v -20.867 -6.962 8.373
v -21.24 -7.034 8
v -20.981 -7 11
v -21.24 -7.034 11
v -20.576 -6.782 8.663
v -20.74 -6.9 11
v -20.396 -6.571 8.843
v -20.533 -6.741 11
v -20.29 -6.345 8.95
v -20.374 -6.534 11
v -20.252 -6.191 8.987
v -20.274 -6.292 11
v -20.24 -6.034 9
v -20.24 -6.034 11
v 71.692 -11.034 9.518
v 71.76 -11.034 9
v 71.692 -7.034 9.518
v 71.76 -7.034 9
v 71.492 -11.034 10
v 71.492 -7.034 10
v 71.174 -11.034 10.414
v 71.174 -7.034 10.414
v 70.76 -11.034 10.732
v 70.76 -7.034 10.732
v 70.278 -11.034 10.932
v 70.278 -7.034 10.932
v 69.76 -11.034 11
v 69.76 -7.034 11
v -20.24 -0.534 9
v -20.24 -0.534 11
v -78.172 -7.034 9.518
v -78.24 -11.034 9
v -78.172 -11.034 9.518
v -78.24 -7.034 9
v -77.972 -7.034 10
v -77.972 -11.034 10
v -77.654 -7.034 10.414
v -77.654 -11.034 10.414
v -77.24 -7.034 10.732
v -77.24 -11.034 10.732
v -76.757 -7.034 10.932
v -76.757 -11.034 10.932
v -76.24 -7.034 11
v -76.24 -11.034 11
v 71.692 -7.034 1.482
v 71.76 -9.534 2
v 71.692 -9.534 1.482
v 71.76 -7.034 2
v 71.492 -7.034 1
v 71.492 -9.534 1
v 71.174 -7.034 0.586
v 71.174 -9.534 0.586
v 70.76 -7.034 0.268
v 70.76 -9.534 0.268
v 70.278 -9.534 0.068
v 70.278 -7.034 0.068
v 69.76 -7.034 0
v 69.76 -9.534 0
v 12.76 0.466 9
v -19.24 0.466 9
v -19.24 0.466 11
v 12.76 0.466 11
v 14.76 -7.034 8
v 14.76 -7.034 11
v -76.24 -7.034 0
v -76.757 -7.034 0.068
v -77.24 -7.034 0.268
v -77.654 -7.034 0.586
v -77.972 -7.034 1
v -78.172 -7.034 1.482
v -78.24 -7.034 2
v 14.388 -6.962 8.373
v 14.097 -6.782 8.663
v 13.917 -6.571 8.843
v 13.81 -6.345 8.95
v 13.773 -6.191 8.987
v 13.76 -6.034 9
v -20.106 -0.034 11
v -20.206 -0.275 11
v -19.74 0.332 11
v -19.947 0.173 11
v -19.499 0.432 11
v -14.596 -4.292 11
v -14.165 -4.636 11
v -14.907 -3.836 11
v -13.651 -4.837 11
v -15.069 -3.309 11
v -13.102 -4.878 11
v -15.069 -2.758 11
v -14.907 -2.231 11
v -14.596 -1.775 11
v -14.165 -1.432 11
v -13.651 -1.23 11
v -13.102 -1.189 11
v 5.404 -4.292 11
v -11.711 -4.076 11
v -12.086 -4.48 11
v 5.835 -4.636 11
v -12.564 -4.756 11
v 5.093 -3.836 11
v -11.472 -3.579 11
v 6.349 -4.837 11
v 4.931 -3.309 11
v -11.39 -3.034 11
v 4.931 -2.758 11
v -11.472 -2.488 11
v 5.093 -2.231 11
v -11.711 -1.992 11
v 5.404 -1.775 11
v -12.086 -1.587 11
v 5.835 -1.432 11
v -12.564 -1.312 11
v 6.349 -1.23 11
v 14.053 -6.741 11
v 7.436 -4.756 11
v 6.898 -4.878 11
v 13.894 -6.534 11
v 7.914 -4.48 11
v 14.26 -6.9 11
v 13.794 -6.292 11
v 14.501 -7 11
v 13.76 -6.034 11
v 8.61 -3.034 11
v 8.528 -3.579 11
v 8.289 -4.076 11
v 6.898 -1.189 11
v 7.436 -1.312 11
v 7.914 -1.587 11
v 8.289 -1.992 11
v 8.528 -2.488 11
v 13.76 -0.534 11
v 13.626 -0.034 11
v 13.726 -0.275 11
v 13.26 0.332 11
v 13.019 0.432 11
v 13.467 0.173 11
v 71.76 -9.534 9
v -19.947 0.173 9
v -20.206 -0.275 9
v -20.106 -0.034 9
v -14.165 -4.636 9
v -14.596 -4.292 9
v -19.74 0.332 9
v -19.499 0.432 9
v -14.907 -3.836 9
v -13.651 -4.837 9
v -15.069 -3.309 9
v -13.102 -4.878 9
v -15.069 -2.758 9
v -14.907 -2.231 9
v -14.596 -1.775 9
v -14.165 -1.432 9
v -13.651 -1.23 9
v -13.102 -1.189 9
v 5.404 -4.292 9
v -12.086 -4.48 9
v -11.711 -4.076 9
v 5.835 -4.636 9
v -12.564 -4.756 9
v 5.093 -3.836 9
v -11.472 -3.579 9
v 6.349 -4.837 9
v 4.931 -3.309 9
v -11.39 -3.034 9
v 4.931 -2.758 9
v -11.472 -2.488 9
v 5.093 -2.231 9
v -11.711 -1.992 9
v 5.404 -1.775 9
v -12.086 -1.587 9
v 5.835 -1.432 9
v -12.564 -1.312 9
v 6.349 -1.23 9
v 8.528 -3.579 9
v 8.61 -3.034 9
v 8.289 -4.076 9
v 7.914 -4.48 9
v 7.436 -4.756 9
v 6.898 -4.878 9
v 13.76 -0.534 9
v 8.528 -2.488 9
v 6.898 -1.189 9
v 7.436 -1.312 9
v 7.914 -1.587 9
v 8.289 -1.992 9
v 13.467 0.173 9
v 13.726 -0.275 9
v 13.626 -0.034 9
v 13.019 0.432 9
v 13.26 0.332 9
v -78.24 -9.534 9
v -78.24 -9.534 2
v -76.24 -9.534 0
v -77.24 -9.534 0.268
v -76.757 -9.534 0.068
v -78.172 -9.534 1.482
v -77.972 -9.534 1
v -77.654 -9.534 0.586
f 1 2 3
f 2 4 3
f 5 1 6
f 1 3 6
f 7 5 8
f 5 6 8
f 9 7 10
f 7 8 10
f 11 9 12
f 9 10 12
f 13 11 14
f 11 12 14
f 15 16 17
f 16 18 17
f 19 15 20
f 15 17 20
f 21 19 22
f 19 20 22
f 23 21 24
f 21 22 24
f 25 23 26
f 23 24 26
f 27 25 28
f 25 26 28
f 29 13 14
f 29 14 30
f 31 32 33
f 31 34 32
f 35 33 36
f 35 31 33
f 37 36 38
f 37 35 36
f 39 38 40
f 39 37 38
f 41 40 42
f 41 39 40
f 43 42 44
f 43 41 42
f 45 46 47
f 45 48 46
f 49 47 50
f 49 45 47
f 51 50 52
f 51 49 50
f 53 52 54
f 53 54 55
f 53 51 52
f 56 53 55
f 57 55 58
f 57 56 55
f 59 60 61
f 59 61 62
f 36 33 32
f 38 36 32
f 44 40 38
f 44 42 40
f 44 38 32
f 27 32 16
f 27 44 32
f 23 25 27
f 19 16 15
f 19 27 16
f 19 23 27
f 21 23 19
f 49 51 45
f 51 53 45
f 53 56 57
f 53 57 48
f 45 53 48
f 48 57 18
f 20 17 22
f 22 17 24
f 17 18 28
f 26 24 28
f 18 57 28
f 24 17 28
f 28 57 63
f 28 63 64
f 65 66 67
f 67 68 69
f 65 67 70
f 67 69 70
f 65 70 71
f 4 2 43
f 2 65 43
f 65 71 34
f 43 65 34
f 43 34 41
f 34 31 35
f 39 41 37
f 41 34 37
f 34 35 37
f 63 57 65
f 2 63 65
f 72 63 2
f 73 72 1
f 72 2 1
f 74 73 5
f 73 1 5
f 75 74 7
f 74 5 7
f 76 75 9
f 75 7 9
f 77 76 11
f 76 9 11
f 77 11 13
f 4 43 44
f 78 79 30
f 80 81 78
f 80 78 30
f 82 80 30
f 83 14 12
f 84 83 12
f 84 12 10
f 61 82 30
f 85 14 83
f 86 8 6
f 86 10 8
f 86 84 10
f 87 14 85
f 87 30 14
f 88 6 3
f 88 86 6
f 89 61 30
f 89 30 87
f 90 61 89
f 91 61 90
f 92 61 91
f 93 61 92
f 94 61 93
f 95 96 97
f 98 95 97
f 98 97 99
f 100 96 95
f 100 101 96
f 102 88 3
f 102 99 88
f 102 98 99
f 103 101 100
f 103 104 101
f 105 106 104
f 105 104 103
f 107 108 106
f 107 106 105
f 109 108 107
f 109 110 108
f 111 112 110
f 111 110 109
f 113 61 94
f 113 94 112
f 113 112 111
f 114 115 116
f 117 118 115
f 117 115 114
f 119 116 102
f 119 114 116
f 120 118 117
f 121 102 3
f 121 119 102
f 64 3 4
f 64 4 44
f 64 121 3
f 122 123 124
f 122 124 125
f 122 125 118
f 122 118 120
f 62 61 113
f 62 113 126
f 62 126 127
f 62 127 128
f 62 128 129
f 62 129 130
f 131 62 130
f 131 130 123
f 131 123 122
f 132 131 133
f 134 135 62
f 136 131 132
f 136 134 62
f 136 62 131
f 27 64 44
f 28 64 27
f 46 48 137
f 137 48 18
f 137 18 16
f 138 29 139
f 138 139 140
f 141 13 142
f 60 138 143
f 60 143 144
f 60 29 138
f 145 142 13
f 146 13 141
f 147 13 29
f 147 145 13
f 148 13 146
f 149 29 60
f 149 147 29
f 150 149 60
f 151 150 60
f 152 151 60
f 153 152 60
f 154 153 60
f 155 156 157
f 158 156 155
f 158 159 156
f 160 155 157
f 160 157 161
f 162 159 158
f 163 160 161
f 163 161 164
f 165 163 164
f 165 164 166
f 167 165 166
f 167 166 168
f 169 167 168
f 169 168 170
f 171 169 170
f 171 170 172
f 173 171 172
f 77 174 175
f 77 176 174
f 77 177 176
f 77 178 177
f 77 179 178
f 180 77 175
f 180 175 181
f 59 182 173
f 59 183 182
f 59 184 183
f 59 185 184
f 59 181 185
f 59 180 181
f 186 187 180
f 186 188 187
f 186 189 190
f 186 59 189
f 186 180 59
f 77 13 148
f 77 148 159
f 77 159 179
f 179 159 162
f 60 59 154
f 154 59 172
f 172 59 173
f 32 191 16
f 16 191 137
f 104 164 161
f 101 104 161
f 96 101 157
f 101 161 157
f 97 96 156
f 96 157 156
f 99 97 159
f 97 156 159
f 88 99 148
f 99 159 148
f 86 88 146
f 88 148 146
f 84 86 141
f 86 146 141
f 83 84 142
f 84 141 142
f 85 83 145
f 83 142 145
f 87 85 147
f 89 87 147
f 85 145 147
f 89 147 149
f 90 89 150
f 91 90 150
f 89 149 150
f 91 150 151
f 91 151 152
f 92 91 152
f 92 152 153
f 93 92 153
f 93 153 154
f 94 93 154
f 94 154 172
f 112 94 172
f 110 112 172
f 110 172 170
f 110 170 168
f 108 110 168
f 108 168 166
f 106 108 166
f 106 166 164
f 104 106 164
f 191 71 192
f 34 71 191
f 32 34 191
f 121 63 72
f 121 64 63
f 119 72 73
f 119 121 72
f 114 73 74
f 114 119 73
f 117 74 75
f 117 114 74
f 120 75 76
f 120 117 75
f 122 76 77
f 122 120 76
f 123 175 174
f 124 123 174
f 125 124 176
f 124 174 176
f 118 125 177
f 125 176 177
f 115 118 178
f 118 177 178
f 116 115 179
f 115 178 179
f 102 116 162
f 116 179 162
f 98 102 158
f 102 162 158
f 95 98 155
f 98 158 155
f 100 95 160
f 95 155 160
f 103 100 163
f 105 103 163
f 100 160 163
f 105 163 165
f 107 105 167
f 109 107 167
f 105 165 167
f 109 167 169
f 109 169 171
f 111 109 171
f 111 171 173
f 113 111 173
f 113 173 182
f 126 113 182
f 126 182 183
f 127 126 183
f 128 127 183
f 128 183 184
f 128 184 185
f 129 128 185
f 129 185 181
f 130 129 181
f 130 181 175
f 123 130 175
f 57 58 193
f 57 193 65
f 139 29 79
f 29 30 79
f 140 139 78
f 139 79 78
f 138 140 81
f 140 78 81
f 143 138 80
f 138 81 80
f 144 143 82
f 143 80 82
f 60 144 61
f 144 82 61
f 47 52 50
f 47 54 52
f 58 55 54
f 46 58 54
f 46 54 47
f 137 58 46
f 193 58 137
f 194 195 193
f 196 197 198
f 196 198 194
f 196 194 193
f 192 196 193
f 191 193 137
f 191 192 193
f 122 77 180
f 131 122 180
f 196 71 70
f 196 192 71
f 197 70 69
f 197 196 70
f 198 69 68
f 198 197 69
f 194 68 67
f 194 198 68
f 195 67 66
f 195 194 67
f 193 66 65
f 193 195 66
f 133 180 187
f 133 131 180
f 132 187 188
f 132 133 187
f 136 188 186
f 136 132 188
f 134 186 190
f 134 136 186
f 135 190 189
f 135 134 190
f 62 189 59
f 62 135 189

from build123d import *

# Parameters (mm, degrees)
F0_W      = 34
F0_H      = 10
F1_DEPTH  = 11
F2_W      = 2.5
F2_H      = 11
F3_DEPTH  = 58
F4_W      = 2.5
F4_H      = 11
F5_DEPTH  = 58
F6_W      = 7.5
F6_H      = 9
F7_DEPTH  = 92.001
F8_R      = 1.85
F9_DEPTH  = 2.001
F10_R     = 1
F11_W     = 150
F11_H     = 2
F12_DEPTH = 1.5
F13_R     = 1.99999


# Not quite as in the source:
# - a fillet or chamfer is up to 0.001 mm smaller than in the source, because OpenCascade refuses the exact size


with BuildPart() as f1:
    # F0 (on Top) → F1 (new body)
    with BuildSketch(Plane.XY):
        with Locations((-3.2397536635, -4.5336725935)):
            Rectangle(F0_W, F0_H)
    extrude(amount=F1_DEPTH)

    # F2 (on face) → F3 (join)
    with BuildSketch(Plane(origin=(-20.2397536635, 0, 0), x_dir=(0, -1, 0), z_dir=(-1, 0, 0))):
        with Locations((8.2836725935, 5.5)):
            Rectangle(F2_W, F2_H)
    extrude(amount=F3_DEPTH)

    # F4 (on face) → F5 (join)
    with BuildSketch(Plane.YZ.offset(13.7602463365)):
        with Locations((-8.2836725935, 5.5)):
            Rectangle(F4_W, F4_H)
    extrude(amount=F5_DEPTH)

    # F6 (on face) → F7 (cut, through all)
    with BuildSketch(Plane.YZ.offset(13.7602463365)):
        with Locations((-3.2836725935, 4.5)):
            Rectangle(F6_W, F6_H)
    extrude(amount=-F7_DEPTH, mode=Mode.SUBTRACT)

    # F8 (on face) → F9 (cut, through all)
    with BuildSketch(Plane(origin=(0, 0, 9), x_dir=(1, 0, 0), z_dir=(0, 0, -1))):
        with Locations((-13.2397536635, 3.0336725935)):
            Circle(F8_R)
        with Locations((6.7602463365, 3.0336725935)):
            Circle(F8_R)
    extrude(amount=-F9_DEPTH, mode=Mode.SUBTRACT)

    # F10
    f10_edges = [f1.edges().sort_by_distance(p)[0] for p in [
        (-3.239754, -7.033673, 9),
        (-20.239754, -7.033673, 10),
        (13.760246, -7.033673, 10),
        (-20.239754, 0.466327, 10),
        (13.760246, 0.466327, 10),
    ]]
    fillet(f10_edges, radius=F10_R)

    # F11 (on face) → F12 (join)
    with BuildSketch(Plane.XZ.offset(9.5336725935)):
        with Locations((-3.2397536635, 10)):
            Rectangle(F11_W, F11_H)
    extrude(amount=F12_DEPTH)

    # F13 (radius 2 in the source; OpenCascade refuses exactly that, so slightly less here)
    f13_edges = [f1.edges().sort_by_distance(p)[0] for p in [
        (-78.239754, -9.033673, 11),
        (-78.239754, -8.283673, 0),
        (71.760246, -9.033673, 11),
        (71.760246, -8.283673, 0),
    ]]
    fillet(f13_edges, radius=F13_R)


solid = f1.part
